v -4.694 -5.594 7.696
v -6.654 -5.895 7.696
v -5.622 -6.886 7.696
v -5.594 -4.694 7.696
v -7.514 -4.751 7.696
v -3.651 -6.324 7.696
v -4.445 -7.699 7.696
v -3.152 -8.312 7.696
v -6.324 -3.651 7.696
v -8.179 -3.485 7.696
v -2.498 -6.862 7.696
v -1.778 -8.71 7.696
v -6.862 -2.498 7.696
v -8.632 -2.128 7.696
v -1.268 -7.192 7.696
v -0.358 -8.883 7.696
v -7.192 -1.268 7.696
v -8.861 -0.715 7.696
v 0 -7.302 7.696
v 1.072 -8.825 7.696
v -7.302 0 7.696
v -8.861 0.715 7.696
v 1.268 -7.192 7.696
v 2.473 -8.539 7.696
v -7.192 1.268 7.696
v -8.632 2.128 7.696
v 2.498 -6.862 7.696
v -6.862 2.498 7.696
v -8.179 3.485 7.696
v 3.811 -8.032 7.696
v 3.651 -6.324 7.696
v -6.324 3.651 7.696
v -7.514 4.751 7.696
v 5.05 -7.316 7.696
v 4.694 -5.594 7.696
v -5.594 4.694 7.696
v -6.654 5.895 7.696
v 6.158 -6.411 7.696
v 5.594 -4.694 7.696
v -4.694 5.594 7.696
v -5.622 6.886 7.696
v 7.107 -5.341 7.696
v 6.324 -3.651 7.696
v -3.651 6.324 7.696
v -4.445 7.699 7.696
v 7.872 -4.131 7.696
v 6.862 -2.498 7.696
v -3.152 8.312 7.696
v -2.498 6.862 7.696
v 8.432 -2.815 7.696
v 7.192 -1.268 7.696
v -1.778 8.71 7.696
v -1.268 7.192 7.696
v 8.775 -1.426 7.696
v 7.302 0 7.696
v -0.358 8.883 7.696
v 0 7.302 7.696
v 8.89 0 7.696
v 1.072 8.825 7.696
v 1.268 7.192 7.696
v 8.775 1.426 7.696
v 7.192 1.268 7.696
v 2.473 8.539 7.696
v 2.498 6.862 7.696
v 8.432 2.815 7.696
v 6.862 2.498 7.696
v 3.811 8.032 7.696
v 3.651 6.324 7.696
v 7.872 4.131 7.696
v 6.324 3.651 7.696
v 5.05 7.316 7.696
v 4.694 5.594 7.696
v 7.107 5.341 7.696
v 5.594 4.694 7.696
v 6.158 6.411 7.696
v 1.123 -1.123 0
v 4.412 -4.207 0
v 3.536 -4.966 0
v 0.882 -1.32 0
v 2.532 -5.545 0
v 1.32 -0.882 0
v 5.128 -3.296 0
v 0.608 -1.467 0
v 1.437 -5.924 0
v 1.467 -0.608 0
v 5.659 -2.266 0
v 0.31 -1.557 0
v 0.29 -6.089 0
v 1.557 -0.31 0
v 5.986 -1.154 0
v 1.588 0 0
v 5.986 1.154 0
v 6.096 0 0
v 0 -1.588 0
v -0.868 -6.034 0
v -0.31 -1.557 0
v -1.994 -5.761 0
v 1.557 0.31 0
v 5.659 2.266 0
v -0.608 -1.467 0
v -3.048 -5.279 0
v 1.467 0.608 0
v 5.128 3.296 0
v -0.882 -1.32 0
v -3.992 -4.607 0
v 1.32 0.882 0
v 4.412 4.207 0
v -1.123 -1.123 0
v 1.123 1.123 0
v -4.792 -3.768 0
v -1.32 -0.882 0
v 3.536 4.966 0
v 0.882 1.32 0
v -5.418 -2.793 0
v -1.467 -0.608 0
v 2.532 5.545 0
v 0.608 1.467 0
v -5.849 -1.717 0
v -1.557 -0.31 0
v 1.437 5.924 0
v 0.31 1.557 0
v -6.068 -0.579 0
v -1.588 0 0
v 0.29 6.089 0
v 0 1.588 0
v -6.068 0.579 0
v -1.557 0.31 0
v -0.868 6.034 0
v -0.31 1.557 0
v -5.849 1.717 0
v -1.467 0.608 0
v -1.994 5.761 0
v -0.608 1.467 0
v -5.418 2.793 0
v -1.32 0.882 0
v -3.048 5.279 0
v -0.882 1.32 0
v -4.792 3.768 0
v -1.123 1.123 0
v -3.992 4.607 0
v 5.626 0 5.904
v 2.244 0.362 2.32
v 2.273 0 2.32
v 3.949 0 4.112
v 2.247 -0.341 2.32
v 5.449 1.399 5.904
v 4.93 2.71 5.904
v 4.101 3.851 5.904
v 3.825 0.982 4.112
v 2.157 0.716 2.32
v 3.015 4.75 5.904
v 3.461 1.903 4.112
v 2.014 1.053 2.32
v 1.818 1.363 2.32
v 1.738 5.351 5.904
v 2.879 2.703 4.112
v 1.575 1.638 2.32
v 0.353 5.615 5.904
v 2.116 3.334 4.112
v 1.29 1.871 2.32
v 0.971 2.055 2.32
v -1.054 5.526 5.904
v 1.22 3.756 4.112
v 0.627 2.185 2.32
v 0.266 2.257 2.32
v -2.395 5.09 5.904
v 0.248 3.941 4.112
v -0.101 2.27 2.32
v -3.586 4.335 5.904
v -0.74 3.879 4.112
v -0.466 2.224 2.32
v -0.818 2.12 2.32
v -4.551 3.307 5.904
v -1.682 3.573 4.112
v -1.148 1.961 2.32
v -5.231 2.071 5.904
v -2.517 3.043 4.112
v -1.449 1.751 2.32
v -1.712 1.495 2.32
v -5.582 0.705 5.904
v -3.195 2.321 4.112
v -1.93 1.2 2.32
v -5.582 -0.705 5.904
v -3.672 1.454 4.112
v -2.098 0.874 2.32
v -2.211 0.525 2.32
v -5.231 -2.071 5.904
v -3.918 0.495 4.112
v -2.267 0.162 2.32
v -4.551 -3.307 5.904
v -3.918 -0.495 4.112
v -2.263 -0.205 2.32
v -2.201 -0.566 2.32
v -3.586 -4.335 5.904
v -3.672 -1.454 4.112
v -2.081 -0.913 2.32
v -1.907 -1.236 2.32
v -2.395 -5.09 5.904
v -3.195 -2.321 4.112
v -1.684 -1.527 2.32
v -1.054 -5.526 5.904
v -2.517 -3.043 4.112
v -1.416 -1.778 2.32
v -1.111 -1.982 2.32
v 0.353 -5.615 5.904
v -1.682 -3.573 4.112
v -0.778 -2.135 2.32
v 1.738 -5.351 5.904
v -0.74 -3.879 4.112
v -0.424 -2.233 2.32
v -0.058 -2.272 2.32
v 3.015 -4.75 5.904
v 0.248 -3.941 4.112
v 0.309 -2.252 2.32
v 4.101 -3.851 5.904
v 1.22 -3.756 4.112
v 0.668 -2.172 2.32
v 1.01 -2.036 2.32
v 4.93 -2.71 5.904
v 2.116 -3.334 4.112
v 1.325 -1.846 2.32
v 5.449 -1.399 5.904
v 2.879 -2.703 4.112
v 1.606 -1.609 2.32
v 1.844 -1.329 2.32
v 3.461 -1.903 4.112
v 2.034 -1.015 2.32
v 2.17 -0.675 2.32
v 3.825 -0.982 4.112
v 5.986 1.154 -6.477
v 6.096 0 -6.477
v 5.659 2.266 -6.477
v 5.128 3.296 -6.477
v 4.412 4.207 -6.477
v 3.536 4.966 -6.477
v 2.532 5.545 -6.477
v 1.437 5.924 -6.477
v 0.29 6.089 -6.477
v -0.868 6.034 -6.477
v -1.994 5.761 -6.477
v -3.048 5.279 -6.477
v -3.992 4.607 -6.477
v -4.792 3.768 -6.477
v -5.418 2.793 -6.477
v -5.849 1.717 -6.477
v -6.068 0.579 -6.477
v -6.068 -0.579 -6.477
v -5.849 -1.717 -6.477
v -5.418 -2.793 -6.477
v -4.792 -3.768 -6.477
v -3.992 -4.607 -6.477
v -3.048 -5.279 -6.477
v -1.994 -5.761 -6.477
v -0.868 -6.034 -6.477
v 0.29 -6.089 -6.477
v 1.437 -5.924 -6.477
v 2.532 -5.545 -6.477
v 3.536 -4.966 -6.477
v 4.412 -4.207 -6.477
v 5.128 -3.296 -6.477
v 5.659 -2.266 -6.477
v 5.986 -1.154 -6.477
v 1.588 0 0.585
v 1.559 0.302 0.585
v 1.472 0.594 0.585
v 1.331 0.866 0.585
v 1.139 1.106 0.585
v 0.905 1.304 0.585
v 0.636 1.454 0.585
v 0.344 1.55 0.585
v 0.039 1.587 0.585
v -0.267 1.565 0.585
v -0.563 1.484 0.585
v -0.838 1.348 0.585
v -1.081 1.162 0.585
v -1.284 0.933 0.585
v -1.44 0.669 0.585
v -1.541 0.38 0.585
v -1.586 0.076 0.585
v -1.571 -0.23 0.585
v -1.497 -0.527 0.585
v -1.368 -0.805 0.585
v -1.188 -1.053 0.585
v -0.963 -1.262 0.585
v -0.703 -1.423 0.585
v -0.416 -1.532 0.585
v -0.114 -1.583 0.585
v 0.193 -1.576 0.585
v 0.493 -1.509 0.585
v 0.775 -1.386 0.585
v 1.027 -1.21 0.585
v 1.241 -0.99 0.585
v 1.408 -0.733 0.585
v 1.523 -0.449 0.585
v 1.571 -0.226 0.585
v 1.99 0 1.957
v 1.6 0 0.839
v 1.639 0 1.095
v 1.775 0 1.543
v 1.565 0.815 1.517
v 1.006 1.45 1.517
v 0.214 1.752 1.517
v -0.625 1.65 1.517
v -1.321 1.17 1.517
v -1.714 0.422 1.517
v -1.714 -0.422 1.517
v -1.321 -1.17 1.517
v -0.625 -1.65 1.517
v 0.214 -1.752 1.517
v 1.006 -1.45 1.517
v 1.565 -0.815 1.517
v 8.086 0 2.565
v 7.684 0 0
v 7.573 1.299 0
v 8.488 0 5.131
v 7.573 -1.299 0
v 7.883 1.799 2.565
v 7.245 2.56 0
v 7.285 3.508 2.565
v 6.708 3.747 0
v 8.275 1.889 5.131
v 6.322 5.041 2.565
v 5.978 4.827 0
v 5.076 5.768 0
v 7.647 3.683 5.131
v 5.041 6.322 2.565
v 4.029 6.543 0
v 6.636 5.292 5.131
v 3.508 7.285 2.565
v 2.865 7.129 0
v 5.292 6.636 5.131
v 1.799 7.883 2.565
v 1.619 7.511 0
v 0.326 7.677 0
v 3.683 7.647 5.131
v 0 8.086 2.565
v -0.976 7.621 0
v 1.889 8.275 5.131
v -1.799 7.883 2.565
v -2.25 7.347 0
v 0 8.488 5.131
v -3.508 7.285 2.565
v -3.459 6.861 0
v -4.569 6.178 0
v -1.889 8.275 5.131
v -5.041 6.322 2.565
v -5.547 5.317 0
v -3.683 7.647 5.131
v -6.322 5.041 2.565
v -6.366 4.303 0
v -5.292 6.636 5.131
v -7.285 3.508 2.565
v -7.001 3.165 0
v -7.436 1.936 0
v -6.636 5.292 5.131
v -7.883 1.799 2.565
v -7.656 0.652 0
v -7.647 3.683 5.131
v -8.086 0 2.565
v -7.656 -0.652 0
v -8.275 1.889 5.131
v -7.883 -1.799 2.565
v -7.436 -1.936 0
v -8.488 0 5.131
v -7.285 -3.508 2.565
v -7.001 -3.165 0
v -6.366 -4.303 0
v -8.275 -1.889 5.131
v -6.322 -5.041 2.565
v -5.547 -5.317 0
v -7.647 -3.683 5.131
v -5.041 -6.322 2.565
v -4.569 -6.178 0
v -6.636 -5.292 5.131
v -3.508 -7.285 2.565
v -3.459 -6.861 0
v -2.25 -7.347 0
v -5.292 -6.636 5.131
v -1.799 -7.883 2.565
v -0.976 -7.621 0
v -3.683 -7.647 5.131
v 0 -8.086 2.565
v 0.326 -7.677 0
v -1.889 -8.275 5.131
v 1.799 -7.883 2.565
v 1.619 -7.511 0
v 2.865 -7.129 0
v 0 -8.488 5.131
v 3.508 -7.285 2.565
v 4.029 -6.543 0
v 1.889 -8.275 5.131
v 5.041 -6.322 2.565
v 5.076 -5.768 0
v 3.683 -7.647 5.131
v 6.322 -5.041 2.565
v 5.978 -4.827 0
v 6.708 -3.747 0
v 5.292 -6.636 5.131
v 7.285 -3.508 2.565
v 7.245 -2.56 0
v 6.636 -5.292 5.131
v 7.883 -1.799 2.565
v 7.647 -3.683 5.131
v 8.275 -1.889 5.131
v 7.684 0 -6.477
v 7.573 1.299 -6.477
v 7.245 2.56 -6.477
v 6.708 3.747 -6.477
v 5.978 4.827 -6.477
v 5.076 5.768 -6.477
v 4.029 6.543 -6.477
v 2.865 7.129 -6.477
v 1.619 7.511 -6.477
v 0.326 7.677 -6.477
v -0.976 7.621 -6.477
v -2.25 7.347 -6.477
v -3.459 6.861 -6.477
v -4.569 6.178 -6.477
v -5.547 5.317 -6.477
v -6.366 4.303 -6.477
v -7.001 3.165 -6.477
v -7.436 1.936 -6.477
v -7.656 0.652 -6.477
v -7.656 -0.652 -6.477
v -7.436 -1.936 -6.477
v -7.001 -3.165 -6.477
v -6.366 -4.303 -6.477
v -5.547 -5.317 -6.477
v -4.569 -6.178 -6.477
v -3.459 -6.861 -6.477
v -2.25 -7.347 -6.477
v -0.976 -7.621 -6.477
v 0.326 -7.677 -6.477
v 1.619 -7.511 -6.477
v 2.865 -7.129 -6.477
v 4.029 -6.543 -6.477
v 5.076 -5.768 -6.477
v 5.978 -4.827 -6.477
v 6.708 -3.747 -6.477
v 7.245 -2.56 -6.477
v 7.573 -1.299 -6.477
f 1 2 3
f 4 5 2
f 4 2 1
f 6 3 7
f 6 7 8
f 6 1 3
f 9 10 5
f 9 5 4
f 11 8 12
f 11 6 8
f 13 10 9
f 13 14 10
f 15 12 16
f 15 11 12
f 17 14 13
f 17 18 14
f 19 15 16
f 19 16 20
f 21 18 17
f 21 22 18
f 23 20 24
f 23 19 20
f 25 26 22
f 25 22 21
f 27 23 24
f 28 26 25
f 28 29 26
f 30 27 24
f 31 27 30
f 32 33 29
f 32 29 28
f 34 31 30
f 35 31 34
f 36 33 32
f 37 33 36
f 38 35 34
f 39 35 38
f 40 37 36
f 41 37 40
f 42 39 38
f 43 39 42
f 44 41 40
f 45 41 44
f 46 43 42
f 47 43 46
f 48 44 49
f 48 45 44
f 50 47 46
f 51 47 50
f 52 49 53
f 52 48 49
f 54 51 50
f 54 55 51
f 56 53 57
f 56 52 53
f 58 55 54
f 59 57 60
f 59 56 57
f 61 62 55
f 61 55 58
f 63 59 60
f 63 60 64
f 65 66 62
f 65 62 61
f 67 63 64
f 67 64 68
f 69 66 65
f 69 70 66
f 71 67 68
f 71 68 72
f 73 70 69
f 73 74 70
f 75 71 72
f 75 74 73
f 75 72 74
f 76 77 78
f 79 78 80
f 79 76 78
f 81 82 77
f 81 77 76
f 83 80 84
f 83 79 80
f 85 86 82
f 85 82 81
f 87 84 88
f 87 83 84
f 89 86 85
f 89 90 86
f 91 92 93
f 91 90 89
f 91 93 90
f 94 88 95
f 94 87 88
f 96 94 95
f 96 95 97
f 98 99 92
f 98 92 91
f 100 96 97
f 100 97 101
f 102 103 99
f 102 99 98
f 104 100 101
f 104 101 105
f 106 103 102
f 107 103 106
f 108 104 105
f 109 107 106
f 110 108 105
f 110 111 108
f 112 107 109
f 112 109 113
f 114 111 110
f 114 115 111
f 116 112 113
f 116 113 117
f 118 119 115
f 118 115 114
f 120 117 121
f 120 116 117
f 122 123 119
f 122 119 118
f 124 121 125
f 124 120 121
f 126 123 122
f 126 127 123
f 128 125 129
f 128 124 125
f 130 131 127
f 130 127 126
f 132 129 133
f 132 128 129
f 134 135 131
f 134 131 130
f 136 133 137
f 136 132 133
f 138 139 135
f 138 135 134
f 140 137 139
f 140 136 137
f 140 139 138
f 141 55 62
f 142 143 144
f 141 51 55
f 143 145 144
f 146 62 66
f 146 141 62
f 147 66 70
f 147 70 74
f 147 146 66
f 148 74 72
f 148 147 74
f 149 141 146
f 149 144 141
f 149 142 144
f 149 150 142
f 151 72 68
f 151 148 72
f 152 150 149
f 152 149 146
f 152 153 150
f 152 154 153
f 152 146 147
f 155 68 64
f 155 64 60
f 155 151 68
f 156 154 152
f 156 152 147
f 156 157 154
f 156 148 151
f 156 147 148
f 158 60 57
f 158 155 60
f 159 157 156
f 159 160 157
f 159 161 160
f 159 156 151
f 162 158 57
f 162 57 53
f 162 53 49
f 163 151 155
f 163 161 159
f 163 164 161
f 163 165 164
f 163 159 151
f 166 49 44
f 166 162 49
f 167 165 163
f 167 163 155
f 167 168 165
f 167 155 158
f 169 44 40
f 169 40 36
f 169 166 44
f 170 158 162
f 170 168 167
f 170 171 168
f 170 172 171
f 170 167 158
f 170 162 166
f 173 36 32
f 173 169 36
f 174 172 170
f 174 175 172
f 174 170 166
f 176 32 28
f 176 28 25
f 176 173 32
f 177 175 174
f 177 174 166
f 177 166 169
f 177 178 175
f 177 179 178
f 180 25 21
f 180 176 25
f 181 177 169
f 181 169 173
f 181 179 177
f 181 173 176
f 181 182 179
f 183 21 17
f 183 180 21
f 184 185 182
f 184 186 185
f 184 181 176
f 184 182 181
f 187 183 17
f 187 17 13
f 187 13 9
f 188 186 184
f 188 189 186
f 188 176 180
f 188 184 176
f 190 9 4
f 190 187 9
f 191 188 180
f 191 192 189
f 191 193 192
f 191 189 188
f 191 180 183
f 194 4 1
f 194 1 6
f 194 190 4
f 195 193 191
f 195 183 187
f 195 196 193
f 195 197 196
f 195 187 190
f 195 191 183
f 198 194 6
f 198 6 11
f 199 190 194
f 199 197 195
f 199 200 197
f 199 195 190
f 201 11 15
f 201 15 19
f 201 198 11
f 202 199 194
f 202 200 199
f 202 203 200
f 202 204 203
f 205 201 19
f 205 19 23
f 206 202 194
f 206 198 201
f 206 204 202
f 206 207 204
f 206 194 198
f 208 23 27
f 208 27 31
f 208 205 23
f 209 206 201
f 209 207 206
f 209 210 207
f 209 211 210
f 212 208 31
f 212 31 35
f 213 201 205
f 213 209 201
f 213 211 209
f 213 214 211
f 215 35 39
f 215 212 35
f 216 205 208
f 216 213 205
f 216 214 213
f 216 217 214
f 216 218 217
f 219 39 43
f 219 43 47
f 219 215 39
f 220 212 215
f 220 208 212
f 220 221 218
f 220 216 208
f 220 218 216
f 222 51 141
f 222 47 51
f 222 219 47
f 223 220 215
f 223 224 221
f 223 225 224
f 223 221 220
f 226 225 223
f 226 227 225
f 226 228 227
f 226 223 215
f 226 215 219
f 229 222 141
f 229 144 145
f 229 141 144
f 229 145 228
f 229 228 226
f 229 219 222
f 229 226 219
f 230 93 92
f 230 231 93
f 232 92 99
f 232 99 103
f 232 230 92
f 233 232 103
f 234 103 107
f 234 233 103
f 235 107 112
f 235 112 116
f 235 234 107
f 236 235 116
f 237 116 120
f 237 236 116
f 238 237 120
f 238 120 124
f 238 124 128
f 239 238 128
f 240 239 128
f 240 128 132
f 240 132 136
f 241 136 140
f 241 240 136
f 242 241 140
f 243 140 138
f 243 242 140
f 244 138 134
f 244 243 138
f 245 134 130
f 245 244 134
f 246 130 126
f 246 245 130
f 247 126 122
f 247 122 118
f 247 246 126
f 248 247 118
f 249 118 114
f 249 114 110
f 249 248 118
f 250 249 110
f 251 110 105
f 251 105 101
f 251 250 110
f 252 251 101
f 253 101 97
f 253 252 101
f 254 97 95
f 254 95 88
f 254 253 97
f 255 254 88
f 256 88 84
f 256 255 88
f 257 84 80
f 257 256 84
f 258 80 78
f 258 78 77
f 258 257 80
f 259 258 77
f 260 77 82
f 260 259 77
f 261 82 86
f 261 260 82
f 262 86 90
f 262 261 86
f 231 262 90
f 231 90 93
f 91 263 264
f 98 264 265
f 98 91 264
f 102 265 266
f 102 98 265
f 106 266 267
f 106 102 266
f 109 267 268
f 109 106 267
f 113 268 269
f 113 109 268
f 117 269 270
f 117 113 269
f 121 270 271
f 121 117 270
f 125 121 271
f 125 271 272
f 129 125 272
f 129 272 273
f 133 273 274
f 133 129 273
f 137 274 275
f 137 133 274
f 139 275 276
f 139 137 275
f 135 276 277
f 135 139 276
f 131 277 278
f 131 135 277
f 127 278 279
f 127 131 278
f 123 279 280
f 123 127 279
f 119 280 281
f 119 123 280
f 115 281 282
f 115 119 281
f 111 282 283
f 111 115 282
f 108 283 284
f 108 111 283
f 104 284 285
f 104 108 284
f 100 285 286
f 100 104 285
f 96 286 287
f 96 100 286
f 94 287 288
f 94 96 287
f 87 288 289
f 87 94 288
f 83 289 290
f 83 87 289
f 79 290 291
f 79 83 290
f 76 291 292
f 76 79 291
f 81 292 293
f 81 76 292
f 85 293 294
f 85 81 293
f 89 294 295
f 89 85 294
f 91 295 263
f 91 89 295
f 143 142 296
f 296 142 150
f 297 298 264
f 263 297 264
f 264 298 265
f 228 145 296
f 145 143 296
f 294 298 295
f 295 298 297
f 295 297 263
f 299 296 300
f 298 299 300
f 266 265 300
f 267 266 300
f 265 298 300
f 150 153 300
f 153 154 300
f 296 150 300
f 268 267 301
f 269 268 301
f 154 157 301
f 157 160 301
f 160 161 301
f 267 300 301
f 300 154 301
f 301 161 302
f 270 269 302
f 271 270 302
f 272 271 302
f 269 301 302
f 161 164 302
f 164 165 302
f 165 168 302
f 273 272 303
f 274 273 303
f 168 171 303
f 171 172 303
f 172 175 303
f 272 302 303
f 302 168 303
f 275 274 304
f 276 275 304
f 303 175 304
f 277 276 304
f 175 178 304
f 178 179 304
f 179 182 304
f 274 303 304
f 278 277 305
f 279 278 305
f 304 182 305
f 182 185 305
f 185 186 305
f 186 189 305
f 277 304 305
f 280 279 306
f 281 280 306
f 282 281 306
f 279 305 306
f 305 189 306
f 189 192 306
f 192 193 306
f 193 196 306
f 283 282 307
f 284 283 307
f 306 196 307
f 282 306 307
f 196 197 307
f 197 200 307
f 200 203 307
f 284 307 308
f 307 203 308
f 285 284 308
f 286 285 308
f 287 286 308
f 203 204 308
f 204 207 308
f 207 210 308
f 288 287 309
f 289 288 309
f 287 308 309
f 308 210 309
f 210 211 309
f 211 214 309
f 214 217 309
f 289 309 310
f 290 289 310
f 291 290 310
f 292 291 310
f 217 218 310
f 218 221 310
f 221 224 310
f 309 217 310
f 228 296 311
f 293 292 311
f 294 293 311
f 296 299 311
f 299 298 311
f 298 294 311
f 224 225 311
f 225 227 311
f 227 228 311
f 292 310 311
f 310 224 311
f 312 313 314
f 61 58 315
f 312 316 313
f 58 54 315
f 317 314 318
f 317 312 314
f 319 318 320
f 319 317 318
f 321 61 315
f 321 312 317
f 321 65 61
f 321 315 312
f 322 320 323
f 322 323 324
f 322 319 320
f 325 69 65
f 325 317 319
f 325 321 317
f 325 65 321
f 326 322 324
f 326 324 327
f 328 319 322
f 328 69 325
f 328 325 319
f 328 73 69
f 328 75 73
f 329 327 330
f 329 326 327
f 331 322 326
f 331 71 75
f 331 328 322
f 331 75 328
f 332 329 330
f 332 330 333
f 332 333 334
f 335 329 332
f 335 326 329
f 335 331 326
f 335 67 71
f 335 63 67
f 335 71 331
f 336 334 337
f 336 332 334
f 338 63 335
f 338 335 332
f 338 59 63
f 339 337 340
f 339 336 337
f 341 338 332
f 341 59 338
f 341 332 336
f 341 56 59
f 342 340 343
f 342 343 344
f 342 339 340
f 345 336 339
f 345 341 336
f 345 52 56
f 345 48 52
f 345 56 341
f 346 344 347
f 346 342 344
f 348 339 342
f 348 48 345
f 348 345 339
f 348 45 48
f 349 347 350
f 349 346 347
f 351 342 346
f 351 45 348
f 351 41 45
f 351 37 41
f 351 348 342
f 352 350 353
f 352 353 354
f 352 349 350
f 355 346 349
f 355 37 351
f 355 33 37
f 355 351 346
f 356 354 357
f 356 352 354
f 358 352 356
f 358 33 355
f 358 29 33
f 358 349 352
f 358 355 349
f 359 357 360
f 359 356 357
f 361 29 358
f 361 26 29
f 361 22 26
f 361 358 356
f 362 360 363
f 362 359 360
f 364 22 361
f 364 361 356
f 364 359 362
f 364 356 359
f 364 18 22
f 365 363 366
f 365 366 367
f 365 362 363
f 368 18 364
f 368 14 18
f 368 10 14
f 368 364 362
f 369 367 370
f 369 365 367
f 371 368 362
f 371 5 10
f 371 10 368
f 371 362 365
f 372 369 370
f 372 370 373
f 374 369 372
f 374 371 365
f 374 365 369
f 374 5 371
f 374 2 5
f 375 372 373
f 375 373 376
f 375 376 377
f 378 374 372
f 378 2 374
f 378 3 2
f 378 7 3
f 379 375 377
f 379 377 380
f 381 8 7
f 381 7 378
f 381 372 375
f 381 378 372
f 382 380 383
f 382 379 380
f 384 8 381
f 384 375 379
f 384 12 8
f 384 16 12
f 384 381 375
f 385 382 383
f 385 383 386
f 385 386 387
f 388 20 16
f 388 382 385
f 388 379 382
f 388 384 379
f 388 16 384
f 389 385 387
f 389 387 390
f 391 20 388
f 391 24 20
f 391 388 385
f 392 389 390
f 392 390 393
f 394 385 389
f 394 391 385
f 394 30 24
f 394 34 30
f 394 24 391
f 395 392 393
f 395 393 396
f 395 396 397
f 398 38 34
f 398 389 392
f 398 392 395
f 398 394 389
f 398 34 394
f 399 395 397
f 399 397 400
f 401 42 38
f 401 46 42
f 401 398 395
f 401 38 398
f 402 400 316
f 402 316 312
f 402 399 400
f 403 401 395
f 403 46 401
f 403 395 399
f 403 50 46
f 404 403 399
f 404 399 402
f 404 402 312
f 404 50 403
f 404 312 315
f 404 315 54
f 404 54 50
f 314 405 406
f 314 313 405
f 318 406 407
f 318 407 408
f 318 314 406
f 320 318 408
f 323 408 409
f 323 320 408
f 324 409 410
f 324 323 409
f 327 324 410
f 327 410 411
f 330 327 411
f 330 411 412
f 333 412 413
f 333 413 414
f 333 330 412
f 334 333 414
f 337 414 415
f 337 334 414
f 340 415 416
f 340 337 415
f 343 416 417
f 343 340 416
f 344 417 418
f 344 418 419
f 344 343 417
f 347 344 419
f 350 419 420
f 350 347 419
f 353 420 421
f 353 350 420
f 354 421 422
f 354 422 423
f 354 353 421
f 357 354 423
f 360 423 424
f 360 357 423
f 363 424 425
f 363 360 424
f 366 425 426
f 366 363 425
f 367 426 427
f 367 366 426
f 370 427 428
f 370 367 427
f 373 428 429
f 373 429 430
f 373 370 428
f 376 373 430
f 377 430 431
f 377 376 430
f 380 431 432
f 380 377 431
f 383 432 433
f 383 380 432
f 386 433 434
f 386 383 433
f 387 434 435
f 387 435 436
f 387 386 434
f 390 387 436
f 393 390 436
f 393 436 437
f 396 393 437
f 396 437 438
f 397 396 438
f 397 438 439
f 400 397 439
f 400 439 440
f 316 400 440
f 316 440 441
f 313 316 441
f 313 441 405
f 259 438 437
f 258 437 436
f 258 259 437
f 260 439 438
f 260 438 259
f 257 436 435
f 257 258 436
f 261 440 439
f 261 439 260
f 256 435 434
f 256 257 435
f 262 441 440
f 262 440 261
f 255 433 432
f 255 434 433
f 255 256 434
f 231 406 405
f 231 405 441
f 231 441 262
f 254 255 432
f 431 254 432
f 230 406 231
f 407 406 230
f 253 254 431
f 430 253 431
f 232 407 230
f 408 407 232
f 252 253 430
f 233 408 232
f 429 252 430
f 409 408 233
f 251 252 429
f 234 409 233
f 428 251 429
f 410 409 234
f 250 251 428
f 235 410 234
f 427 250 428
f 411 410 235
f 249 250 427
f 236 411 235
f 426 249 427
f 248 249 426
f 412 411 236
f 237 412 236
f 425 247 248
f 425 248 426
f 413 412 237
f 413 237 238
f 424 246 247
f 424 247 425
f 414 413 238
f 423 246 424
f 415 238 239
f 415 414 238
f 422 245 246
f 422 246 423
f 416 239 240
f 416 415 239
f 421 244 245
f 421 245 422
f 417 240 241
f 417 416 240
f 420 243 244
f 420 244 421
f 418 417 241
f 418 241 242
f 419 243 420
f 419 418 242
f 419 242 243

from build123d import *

# Parameters (mm, degrees)
FILLET_R = 2.54


with BuildPart() as part:
    # Sketch → Revolution (revolve)
    with BuildSketch(Plane.XZ):
        Polygon((6.096, 0), (6.096, -6.477), (7.6835, -6.477), (7.6835, 0), (8.89, 7.6962), (7.3025, 7.6962), (1.5875, 1.5875), (1.5875, 0), align=None)
    revolve(axis=Axis((0, 0, 0), (0, 0, 1)))

    # Fillet
    fillet_edges = [part.edges().sort_by_distance(p)[0] for p in [
        (-1.5875, 0, 1.5875),
    ]]
    fillet(fillet_edges, radius=FILLET_R)


solid = part.part
